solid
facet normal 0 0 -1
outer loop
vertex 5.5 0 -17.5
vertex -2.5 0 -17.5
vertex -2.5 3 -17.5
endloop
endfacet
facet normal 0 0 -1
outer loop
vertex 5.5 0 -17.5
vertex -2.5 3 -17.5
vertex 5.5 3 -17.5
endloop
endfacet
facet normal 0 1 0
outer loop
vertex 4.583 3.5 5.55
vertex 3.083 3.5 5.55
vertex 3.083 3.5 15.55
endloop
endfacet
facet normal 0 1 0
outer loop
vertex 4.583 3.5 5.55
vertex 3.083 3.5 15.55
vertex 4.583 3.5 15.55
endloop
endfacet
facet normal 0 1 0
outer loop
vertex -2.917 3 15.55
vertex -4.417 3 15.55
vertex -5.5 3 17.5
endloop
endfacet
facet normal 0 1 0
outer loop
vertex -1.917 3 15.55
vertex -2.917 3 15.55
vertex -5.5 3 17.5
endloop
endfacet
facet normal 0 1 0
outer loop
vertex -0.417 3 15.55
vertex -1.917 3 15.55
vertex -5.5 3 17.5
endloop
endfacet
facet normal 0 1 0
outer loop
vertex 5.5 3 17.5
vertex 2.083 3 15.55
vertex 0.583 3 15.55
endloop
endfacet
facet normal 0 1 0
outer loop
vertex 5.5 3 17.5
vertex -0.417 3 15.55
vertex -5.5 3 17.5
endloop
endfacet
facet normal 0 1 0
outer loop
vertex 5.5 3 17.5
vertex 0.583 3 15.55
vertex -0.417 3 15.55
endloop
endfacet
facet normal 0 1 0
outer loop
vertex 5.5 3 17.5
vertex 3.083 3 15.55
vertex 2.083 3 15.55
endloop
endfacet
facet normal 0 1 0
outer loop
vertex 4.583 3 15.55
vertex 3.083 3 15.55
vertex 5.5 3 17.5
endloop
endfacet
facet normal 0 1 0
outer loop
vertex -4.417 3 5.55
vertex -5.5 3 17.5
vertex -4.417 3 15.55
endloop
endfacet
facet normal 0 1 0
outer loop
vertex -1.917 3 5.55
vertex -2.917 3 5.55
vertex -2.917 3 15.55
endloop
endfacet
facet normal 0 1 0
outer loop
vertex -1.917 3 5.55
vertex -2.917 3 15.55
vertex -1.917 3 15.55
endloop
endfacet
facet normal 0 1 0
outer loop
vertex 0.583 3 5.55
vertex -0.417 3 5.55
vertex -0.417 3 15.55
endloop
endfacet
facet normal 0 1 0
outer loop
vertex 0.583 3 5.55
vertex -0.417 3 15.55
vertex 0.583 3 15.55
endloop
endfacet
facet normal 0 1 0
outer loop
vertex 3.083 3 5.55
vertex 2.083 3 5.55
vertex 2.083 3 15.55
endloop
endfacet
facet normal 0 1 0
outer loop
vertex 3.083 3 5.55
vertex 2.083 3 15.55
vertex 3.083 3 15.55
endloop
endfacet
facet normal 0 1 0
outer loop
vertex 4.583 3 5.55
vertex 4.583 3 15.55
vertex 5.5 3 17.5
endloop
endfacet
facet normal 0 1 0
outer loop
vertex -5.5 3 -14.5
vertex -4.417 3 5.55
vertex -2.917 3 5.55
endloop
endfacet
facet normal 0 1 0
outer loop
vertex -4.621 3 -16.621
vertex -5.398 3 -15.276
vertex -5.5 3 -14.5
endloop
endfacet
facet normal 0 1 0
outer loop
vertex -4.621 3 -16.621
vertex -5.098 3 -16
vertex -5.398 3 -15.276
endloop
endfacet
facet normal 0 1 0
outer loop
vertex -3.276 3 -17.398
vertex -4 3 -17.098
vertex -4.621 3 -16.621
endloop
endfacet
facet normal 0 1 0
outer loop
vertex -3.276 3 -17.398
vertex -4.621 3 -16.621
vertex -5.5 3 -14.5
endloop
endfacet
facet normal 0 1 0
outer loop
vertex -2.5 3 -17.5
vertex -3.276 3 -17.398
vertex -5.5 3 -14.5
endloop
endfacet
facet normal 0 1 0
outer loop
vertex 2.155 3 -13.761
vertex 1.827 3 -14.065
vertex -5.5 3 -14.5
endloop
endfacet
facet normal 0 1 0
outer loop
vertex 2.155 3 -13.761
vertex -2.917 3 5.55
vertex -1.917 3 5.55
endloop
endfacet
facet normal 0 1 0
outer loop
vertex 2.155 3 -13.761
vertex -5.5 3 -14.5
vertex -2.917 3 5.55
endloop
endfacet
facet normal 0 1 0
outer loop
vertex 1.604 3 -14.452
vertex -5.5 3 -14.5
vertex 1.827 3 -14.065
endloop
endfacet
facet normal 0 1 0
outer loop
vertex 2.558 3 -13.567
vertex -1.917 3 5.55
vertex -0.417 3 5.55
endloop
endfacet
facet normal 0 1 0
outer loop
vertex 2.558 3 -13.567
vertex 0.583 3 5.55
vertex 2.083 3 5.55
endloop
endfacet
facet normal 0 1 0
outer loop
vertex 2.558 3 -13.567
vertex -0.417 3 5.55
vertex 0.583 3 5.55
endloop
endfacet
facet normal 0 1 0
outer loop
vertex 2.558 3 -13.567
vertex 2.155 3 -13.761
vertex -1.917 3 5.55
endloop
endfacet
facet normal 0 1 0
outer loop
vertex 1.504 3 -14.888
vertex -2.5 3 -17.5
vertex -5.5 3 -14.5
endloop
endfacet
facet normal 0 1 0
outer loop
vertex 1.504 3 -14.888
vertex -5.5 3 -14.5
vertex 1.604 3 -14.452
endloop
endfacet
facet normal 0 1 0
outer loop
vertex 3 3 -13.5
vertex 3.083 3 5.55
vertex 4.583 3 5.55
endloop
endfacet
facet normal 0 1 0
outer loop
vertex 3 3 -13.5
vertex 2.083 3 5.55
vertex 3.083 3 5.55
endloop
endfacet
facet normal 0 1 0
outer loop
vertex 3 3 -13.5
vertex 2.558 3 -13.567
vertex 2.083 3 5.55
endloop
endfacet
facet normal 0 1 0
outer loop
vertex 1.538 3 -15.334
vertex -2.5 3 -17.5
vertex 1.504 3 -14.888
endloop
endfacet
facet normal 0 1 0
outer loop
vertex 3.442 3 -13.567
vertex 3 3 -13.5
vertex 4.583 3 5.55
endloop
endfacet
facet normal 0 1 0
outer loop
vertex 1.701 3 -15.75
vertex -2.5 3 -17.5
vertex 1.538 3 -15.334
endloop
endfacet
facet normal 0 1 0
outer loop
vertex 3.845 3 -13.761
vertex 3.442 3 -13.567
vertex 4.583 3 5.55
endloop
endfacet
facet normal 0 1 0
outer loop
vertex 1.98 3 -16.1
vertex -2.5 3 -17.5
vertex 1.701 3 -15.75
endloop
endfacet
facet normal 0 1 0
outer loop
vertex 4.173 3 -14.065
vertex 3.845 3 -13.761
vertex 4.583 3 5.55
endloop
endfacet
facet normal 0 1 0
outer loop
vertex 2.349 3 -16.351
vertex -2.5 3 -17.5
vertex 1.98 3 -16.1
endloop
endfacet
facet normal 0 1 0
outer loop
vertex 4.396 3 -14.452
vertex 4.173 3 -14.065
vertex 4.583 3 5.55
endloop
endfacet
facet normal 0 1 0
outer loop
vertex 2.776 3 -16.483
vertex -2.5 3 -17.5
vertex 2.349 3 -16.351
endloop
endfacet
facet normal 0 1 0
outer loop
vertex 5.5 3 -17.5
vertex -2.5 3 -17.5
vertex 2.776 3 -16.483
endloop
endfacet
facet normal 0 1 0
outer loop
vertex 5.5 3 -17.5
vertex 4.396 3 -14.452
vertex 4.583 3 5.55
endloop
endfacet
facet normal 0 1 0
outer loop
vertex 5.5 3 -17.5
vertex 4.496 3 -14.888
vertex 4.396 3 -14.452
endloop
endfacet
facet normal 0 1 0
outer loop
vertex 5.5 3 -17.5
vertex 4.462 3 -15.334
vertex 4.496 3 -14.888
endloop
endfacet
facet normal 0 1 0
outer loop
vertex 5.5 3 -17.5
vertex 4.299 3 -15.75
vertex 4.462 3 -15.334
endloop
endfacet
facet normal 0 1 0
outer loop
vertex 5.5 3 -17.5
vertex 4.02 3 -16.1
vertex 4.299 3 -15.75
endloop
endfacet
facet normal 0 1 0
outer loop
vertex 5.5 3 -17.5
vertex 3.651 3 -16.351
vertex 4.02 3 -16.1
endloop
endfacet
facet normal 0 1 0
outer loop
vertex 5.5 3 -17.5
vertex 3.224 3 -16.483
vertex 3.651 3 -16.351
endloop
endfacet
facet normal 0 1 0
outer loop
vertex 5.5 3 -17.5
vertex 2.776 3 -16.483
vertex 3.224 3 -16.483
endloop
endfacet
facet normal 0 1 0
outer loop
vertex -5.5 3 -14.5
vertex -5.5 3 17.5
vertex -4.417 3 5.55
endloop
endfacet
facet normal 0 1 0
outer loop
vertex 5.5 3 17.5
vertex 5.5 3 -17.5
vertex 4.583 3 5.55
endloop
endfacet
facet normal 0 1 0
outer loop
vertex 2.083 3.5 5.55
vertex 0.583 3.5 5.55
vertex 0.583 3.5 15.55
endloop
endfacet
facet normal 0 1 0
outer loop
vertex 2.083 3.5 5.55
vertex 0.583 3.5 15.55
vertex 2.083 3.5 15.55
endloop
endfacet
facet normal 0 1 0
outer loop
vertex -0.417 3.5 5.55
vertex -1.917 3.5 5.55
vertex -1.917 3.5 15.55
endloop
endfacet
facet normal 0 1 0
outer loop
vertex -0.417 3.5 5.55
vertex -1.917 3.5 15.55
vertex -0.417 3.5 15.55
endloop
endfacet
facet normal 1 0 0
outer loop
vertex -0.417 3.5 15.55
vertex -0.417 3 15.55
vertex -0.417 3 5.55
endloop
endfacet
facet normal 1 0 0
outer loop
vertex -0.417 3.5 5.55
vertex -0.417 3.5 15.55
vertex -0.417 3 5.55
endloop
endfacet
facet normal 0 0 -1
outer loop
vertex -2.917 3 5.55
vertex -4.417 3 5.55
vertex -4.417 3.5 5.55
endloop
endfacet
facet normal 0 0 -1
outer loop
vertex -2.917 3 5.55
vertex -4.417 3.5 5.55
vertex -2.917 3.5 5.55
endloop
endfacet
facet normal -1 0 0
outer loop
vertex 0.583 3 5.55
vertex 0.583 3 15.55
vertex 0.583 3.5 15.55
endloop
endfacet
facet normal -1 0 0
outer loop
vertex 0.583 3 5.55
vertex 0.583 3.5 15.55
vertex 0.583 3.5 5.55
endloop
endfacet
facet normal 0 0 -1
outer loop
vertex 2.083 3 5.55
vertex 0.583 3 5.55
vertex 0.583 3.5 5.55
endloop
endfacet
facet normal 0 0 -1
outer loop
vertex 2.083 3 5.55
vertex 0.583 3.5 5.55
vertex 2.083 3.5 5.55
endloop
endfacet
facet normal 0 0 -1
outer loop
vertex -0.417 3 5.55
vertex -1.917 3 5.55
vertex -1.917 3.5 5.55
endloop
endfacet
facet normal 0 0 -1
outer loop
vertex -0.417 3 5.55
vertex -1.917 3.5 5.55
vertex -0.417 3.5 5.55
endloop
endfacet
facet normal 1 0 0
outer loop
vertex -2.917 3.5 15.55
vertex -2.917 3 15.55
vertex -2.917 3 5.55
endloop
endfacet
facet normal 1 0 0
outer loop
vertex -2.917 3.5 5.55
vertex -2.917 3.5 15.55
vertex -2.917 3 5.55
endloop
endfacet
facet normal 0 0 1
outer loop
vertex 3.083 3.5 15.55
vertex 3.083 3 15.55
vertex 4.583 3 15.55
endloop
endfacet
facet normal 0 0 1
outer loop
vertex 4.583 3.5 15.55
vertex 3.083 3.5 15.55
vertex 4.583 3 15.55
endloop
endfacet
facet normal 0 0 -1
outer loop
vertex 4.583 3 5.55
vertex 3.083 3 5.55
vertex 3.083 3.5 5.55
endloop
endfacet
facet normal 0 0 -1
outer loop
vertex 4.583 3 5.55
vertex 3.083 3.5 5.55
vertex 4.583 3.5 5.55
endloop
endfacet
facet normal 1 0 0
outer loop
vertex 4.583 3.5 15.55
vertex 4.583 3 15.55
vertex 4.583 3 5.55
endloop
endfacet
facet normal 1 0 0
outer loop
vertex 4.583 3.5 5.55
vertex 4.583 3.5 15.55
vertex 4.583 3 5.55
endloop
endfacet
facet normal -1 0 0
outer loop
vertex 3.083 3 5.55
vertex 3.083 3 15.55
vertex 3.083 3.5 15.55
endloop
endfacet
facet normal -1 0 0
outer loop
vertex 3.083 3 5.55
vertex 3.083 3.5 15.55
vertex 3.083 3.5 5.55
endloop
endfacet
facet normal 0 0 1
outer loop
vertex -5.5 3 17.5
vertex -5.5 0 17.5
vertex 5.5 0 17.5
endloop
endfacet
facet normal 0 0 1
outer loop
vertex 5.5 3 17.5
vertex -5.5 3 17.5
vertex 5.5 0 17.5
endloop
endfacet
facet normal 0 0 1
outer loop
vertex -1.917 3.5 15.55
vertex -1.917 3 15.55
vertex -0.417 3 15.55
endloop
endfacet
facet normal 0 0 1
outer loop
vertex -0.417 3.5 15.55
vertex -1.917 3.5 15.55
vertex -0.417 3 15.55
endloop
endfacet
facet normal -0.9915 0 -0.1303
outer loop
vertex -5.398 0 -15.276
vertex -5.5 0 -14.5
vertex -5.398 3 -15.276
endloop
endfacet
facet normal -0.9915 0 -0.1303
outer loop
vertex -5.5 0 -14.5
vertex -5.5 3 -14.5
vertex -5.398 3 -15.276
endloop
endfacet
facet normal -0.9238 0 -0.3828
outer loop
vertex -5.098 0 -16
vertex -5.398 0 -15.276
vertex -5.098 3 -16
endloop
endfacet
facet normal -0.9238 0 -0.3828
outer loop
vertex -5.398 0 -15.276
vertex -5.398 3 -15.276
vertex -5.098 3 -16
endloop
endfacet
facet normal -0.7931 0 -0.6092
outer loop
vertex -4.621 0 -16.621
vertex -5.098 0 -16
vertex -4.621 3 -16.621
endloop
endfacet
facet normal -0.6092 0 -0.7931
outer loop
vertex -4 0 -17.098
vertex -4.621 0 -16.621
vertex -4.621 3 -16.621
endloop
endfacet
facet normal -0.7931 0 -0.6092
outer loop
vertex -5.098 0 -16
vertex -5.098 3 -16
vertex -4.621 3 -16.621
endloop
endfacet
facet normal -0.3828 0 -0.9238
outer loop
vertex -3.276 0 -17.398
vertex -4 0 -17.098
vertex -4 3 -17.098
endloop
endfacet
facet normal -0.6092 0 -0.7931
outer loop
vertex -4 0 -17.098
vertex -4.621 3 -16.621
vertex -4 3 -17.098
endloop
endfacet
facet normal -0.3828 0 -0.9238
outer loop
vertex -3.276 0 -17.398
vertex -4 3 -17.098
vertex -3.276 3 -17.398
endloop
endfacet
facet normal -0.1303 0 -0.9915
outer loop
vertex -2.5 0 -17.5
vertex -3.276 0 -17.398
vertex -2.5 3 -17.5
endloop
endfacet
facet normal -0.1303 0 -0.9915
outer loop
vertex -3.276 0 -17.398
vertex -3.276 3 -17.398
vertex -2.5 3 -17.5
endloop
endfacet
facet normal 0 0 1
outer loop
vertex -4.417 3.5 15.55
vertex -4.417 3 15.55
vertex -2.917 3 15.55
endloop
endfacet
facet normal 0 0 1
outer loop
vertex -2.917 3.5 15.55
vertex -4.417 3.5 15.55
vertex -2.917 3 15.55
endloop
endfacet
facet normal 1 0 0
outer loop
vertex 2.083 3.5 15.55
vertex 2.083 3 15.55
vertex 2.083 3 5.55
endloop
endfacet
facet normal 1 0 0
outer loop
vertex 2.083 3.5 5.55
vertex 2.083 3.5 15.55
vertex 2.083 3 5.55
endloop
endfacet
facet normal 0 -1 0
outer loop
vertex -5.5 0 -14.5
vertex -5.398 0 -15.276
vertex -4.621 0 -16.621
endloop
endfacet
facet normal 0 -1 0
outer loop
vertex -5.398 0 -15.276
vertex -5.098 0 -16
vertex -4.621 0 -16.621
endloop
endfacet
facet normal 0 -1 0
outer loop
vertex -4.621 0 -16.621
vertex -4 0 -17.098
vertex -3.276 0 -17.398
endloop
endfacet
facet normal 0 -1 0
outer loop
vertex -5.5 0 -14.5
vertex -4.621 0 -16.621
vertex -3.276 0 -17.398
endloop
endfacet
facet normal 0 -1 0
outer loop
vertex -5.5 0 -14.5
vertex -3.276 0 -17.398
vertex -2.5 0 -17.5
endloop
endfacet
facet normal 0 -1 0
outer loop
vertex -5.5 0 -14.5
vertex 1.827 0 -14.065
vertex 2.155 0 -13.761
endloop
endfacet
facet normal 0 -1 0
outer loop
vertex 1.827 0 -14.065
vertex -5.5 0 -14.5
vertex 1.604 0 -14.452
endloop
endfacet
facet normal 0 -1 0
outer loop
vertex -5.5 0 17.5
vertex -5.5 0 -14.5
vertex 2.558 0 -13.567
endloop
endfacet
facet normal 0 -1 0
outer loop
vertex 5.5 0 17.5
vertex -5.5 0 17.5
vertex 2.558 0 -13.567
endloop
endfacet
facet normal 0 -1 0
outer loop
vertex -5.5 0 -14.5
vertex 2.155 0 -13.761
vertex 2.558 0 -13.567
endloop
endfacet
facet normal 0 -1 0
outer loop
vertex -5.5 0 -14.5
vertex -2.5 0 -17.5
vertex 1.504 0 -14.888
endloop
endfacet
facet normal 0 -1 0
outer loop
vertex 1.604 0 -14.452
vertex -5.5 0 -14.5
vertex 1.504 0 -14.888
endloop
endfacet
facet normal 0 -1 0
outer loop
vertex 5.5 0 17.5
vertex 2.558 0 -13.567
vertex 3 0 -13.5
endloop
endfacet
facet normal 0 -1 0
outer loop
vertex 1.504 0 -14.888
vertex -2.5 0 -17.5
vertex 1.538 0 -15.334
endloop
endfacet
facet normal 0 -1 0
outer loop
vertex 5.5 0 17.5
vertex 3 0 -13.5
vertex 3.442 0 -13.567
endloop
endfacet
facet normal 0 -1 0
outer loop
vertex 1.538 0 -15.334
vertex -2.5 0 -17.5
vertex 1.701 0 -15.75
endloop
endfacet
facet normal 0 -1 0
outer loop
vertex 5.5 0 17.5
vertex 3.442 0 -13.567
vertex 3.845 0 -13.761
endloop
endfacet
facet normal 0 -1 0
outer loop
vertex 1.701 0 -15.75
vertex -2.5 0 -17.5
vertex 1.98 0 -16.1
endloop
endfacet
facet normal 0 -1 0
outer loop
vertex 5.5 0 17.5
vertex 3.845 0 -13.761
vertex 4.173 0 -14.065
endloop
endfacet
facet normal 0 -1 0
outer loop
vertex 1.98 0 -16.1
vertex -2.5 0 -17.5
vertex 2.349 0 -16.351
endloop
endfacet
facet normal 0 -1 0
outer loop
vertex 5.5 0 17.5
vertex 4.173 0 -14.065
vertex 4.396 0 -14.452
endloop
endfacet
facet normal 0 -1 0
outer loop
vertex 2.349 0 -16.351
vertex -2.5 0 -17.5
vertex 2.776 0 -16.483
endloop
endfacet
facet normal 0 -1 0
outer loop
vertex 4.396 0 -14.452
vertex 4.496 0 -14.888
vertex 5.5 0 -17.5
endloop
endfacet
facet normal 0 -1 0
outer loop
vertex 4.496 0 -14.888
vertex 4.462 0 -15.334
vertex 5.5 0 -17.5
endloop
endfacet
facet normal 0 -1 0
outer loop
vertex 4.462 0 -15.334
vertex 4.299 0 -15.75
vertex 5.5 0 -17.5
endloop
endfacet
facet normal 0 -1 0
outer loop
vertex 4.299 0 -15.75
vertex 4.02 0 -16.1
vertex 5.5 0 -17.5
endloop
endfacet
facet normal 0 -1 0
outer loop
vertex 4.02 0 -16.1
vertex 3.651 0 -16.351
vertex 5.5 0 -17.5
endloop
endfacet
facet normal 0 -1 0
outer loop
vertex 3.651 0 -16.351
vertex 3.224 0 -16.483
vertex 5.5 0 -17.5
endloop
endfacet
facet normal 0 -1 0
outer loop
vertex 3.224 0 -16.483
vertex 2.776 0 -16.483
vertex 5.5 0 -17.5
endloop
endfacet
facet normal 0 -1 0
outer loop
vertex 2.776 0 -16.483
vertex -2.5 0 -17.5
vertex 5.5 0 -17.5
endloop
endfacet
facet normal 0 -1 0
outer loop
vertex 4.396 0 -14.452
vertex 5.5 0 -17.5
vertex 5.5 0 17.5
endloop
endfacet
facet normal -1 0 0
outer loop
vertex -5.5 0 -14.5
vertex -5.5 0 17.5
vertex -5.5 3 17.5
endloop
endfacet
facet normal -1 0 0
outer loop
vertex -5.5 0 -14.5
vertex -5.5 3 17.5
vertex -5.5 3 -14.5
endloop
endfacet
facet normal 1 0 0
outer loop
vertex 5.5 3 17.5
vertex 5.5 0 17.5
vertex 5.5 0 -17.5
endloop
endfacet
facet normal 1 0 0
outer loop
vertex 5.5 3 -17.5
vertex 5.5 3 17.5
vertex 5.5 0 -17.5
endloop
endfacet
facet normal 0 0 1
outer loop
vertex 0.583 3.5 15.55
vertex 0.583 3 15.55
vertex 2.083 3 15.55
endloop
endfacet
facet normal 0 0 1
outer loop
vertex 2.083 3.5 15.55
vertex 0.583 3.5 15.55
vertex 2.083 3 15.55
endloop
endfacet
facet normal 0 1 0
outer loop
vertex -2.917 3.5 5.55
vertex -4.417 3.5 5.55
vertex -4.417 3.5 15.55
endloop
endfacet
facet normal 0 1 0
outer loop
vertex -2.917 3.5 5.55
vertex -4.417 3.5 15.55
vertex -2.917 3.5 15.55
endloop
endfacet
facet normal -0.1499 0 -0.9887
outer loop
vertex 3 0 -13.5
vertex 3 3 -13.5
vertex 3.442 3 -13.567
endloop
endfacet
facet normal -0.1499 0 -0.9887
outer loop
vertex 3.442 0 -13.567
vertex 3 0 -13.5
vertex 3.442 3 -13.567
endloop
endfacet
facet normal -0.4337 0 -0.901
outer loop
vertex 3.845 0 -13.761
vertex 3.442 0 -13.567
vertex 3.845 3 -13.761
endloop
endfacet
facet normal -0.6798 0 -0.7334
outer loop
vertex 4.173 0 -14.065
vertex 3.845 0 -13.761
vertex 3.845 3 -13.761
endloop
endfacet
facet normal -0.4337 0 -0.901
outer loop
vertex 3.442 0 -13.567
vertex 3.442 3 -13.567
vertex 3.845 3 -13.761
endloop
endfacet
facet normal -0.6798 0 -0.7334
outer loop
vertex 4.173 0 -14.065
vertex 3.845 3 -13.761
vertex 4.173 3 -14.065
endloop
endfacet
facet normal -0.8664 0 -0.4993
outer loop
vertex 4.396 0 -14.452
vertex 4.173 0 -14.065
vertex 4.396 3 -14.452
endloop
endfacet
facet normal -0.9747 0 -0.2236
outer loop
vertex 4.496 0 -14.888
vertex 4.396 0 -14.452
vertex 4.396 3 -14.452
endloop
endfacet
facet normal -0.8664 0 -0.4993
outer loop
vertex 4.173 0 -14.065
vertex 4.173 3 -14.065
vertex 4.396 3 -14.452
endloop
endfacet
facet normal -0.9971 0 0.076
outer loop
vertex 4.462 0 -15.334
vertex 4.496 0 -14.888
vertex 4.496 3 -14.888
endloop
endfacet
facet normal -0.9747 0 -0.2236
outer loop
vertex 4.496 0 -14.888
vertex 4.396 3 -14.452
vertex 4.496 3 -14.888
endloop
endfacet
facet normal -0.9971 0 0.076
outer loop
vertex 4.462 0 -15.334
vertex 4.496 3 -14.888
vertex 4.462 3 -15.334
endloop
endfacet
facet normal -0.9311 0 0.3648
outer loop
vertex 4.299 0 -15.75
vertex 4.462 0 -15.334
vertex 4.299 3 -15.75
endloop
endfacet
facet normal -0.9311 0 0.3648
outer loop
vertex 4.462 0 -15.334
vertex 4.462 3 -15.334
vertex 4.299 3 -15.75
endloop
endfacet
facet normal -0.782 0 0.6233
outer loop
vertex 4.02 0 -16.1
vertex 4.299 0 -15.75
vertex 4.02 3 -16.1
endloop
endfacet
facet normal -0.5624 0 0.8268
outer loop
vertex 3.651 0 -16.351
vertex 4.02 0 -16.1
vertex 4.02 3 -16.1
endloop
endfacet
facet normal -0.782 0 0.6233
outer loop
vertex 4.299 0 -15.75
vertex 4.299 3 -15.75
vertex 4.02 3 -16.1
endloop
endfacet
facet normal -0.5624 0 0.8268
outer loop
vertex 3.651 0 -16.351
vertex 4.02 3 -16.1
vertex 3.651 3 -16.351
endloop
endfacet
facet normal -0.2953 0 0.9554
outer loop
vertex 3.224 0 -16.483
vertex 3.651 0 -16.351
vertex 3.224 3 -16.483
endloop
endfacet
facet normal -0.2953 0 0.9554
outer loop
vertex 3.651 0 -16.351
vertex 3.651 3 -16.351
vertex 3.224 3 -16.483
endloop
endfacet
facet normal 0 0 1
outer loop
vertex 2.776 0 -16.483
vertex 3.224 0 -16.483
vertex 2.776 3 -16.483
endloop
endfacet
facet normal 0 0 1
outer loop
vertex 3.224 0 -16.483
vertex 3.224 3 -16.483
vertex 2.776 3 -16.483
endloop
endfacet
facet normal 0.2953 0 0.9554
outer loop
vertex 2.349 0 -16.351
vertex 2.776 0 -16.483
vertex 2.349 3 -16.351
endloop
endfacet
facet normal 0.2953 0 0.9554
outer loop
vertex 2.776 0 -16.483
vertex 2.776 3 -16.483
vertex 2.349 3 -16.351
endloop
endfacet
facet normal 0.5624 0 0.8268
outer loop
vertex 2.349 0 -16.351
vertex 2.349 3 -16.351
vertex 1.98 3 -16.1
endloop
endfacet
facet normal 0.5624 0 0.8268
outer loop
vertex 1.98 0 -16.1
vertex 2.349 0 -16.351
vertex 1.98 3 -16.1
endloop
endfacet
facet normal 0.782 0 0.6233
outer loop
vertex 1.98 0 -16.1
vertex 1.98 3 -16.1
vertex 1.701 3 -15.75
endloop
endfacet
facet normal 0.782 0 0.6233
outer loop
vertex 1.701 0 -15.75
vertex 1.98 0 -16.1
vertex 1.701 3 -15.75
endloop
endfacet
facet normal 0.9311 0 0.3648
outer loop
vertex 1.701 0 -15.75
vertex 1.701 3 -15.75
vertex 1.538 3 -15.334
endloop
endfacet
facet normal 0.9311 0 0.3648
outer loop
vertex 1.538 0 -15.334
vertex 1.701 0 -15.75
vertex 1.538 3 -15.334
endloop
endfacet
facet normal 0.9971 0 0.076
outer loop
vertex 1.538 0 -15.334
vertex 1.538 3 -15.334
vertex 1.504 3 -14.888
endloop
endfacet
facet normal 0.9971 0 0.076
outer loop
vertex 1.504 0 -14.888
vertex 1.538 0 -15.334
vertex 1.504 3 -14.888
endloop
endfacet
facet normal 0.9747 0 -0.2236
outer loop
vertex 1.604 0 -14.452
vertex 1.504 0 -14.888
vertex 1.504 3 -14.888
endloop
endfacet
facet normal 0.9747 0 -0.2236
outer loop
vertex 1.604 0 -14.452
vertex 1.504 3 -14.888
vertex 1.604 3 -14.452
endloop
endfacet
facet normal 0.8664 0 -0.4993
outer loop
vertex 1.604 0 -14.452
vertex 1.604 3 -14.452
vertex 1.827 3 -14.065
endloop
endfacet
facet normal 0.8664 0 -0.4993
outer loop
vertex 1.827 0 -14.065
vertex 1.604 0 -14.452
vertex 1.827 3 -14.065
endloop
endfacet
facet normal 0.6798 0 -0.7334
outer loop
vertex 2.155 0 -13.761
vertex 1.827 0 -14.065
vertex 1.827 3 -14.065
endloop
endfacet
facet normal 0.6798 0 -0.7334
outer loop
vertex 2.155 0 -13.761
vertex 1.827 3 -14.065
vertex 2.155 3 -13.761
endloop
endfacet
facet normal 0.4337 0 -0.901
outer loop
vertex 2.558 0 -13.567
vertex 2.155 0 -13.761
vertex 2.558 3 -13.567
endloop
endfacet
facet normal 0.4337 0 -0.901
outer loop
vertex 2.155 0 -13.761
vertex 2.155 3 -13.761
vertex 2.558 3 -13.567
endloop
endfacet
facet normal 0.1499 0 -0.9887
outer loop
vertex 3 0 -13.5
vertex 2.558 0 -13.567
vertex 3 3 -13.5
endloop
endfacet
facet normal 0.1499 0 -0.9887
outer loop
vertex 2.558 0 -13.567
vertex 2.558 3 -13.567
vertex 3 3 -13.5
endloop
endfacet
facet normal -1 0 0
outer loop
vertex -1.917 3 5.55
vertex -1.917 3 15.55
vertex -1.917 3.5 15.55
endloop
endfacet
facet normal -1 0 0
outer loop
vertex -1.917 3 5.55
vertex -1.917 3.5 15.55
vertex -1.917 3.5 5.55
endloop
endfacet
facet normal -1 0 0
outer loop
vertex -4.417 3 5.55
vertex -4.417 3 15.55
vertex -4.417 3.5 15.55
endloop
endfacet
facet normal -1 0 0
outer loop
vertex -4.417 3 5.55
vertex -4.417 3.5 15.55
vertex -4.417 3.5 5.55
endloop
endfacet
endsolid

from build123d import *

# Parameters (mm, degrees)
SKETCH1_W           = 11
SKETCH1_H           = 35
BOSS_EXTRUDE1_DEPTH = 3
SKETCH2_R           = 1.5
CUT_EXTRUDE1_DEPTH  = 3
FILLET1_R           = 3
SKETCH3_W           = 1.5
SKETCH3_H           = 10
BOSS_EXTRUDE2_DEPTH = 0.5


with BuildPart() as part:
    # Sketch1 → Boss-Extrude1 (new body)
    with BuildSketch(Plane(origin=(0, 0, 0), x_dir=(1, 0, 0), z_dir=(0, 1, 0))):
        Rectangle(SKETCH1_W, SKETCH1_H)
    extrude(amount=BOSS_EXTRUDE1_DEPTH)

    # Sketch2 → Cut-Extrude1 (cut)
    with BuildSketch(Plane(origin=(0, 3, 0), x_dir=(1, 0, 0), z_dir=(0, 1, 0))):
        with Locations(Location((3, 15, 0), (0, 0, 270))):
            Circle(SKETCH2_R)
    extrude(amount=-CUT_EXTRUDE1_DEPTH, mode=Mode.SUBTRACT)

    # Fillet1
    fillet1_edges = [part.edges().sort_by_distance(p)[0] for p in [
        (-5.5, 1.5, -17.5),
    ]]
    fillet(fillet1_edges, radius=FILLET1_R)

    # Sketch3 → Boss-Extrude2 (add)
    with BuildSketch(Plane(origin=(0, 3, 0), x_dir=(1, 0, 0), z_dir=(0, 1, 0))):
        with Locations((-1.167481663, -10.550122249)):
            Rectangle(SKETCH3_W, SKETCH3_H)
        with Locations((-3.667481663, -10.550122249)):
            Rectangle(SKETCH3_W, SKETCH3_H)
        with Locations((1.332518337, -10.550122249)):
            Rectangle(SKETCH3_W, SKETCH3_H)
        with Locations((3.832518337, -10.550122249)):
            Rectangle(SKETCH3_W, SKETCH3_H)
    extrude(amount=BOSS_EXTRUDE2_DEPTH)


solid = part.part
